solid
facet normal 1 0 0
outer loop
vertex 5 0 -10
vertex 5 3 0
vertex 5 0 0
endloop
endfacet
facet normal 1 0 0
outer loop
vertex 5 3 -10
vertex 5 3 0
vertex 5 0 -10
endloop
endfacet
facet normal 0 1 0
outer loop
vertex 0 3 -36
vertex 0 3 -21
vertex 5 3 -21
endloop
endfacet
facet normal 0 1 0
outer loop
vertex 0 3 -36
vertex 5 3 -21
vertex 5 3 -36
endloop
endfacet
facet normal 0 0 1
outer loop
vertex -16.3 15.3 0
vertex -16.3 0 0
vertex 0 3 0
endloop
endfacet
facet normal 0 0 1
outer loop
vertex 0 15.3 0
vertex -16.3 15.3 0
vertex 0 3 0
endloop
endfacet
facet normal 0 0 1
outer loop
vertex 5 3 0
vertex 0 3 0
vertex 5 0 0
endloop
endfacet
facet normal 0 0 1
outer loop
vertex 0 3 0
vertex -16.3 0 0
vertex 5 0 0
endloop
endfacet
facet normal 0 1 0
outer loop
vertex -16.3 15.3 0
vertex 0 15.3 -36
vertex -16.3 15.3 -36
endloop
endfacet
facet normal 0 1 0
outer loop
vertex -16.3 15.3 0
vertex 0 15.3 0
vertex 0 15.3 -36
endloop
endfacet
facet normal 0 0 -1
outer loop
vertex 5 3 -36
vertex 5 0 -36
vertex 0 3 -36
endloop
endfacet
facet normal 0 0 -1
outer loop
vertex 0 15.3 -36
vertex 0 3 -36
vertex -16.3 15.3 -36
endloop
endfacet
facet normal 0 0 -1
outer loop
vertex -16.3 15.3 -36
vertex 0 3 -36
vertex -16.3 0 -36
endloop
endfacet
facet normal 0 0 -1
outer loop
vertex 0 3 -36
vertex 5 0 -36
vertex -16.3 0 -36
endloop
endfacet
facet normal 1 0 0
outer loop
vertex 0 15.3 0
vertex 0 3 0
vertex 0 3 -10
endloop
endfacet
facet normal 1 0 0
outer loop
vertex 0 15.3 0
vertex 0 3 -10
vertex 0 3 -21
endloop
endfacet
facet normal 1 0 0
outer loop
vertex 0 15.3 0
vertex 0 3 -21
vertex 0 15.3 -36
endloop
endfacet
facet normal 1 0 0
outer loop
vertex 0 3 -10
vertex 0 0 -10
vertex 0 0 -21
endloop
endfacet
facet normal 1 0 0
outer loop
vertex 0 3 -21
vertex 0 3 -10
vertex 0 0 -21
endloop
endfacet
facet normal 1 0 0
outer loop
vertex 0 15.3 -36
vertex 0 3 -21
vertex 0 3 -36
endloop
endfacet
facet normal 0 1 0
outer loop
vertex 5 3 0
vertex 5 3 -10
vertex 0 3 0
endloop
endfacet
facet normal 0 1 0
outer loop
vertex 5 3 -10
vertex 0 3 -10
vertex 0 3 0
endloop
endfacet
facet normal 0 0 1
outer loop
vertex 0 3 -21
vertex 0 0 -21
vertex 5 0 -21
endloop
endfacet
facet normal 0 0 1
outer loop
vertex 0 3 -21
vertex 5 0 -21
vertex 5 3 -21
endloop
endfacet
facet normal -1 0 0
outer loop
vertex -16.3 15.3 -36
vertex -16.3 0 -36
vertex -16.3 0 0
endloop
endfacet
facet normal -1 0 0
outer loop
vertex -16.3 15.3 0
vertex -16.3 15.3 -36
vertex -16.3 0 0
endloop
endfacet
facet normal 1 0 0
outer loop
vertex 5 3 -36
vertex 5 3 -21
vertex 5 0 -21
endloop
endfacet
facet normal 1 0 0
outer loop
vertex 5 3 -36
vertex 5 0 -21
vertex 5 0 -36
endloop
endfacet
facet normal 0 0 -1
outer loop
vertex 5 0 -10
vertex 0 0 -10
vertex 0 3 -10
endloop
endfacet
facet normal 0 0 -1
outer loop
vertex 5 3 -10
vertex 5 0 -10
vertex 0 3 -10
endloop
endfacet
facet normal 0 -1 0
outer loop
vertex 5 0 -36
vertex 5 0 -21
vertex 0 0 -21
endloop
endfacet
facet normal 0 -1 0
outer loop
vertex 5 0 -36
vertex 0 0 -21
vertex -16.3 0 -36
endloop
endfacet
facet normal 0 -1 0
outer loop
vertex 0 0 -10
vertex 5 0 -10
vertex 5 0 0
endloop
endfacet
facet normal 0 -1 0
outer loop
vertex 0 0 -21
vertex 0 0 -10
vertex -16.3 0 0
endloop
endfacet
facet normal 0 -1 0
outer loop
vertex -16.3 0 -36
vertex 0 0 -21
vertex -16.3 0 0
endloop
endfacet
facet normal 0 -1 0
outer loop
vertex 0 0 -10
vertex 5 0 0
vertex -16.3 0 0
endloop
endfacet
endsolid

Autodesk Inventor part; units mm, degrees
ref_plane "YZ Plane" through (0, 0, 0) normal (1, 0, 0) x (0, 1, 0)
ref_plane "XZ Plane" through (0, 0, 0) normal (0, 1, 0) x (-1, 0, 0)
ref_plane "XY Plane" through (0, 0, 0) normal (0, 0, 1) x (1, 0, 0)
sketch "Sketch1" plane through (0, 0, 0) normal (0, 1, 0) x (-1, 0, 0)
  line L0 (16.3, 0) -> (0, 0)
  line L1 (0, 0) -> (0, -36)
  line L2 (0, -36) -> (16.3, -36)
  line L3 (16.3, -36) -> (16.3, 0)
  dimension "d0" = 36
  dimension "d1" = 16.3
extrude "Extrusion1" add sketch "Sketch1" along normal blind 15.3
sketch "Sketch2" plane through (0, 0, 0) normal (1, 0, 0) x (0, 0, -1)
  line L0 (0, 0) -> (0, 15.3) projected
  line L1 (0, 0) -> (10, 0)
  line L2 (10, 0) -> (10, 3)
  line L3 (10, 3) -> (0, 3)
  line L4 (0, 3) -> (0, 0)
  line L5 (0, 0) -> (36, 0) projected
  line L6 (36, 0) -> (21, 0)
  line L7 (21, 0) -> (21, 3)
  line L8 (21, 3) -> (36, 3)
  line L9 (36, 3) -> (36, 0)
  point P0 (0, 3)
  dimension "d4" = 10
  dimension "d5" = 3
  dimension "d6" = 15
extrude "Extrusion2" add sketch "Sketch2" along normal blind 5
properties part number "AC-DC transformer"
